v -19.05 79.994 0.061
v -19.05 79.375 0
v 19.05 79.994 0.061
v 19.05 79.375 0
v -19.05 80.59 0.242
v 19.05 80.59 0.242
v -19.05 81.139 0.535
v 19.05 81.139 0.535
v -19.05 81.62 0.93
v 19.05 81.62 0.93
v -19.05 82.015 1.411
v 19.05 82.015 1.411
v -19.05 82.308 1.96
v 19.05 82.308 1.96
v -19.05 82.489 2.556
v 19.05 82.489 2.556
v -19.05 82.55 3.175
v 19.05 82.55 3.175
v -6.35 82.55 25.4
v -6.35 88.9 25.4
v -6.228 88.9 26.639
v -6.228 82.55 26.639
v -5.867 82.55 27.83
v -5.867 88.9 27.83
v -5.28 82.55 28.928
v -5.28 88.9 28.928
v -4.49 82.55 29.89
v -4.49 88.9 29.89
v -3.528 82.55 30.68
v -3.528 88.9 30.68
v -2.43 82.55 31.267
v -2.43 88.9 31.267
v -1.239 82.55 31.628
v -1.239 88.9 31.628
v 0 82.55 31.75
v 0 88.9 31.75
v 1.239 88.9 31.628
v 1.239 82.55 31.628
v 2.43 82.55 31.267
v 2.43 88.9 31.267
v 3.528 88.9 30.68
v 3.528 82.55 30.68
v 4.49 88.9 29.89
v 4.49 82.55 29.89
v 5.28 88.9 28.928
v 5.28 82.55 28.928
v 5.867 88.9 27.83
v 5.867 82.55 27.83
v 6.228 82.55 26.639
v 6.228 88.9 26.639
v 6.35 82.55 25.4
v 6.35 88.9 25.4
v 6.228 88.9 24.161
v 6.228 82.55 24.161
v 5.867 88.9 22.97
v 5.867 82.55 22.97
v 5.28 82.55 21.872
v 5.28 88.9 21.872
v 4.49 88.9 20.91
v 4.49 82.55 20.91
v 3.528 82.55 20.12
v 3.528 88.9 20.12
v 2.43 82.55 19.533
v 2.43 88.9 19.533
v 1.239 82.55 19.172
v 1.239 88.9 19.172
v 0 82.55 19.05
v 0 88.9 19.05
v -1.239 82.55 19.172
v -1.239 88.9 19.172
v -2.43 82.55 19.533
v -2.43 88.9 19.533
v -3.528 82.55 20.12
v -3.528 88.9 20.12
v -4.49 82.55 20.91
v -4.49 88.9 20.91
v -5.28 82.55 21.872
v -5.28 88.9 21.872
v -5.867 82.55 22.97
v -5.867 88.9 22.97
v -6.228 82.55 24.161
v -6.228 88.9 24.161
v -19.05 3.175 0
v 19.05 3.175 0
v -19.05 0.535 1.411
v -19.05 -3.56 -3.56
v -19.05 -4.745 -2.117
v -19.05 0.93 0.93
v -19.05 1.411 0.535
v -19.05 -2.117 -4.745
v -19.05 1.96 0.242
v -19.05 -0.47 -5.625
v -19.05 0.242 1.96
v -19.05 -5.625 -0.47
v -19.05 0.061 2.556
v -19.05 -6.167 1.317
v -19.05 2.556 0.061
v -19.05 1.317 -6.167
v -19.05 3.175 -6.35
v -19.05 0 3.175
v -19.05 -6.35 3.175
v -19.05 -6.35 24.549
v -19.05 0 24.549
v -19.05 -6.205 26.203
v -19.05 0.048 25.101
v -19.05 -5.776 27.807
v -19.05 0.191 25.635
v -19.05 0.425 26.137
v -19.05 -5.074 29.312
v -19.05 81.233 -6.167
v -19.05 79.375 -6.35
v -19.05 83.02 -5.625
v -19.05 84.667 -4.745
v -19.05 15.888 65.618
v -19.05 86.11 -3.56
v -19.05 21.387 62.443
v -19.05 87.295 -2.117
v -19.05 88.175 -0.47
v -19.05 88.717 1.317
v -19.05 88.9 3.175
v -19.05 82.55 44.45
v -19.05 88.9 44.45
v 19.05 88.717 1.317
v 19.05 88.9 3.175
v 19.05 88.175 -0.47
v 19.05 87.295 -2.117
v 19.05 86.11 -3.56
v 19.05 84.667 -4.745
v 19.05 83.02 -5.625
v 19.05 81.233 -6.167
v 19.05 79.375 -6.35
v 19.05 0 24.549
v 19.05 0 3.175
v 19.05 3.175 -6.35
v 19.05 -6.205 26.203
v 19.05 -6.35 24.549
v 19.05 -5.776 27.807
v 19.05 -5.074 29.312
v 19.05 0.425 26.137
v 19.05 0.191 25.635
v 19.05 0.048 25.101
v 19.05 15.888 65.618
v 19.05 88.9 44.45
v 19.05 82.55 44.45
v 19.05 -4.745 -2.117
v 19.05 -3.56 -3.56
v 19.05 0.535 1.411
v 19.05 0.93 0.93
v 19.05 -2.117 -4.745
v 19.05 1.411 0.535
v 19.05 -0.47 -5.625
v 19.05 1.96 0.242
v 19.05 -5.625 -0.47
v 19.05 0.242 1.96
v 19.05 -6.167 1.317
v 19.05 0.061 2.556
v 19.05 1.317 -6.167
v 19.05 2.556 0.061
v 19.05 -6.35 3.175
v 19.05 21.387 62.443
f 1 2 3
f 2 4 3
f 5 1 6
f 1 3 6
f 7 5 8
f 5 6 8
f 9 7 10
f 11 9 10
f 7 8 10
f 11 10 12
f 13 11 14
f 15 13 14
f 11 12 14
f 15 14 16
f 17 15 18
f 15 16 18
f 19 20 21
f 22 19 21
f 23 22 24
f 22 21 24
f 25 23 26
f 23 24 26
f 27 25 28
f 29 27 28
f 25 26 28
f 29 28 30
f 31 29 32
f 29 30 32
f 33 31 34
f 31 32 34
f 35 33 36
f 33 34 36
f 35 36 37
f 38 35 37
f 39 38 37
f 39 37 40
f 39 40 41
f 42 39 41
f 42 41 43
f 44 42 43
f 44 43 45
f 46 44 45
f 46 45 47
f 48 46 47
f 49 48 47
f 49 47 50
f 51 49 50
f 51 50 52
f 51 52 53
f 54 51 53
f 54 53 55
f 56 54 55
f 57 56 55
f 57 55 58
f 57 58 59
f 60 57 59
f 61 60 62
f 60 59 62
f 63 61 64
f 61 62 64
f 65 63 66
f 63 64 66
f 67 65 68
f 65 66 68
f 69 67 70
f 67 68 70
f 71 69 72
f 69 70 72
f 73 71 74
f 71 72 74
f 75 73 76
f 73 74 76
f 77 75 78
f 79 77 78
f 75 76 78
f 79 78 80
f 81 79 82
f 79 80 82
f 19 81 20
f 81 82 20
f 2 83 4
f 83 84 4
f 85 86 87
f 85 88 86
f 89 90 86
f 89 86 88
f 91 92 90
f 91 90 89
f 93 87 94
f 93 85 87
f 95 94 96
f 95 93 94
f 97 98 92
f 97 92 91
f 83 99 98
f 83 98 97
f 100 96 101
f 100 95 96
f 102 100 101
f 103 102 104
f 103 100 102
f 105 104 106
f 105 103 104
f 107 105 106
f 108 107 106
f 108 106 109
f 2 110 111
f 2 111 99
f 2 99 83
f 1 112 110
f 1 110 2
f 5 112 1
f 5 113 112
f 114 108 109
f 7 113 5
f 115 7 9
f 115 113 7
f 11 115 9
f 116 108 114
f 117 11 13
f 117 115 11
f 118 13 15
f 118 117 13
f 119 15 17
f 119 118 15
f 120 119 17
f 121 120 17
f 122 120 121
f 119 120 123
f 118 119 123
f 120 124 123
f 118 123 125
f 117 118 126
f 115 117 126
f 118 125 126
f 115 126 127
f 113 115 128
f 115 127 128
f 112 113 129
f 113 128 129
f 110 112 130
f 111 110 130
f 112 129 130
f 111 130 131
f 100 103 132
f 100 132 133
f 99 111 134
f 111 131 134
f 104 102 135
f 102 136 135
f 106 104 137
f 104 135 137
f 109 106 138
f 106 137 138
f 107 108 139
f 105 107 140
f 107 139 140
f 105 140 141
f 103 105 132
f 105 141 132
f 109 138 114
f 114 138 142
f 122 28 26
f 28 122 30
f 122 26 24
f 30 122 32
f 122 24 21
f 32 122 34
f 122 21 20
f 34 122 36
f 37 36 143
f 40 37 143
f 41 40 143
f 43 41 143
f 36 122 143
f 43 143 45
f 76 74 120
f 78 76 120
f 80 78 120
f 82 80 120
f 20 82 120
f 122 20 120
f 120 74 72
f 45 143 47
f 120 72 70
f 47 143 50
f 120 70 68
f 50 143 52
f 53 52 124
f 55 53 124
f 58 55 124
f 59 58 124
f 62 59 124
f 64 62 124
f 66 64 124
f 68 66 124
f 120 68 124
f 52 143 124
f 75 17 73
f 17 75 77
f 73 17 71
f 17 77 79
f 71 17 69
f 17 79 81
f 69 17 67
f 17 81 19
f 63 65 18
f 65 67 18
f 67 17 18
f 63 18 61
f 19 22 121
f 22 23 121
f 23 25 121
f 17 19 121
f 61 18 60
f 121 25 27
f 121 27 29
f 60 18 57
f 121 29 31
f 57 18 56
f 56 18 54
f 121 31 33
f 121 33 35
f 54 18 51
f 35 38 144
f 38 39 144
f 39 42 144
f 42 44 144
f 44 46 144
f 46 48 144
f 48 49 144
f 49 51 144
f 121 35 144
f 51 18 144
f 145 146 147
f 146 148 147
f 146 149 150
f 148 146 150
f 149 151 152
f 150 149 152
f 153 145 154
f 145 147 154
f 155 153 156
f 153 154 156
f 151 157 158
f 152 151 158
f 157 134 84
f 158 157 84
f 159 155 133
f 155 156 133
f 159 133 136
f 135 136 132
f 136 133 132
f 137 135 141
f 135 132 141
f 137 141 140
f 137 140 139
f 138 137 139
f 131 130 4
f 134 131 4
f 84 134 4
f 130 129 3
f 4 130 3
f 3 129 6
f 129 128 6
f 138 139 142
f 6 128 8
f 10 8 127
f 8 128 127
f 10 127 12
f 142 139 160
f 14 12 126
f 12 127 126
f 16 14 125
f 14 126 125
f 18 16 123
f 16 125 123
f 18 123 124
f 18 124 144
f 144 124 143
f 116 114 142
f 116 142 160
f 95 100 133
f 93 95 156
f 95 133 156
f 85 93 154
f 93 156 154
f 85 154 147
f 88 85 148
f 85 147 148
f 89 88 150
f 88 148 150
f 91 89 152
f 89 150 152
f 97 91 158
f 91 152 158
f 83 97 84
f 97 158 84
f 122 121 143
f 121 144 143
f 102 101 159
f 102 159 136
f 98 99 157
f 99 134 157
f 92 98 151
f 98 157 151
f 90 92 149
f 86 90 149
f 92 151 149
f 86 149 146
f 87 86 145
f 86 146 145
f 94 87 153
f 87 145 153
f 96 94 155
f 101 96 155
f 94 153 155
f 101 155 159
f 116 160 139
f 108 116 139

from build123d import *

# Parameters (mm, degrees)
BASE_EXTRUDE_THIN_DEPTH = 19.05
CUT_EXTRUDE1_REACH      = 97.25
SKETCH2_R               = 6.35


with BuildPart() as part:
    # Sketch1 → Base-Extrude-Thin (new body, symmetric)
    with BuildSketch(Plane(origin=(0, 0, 0), x_dir=(0, 0, -1), z_dir=(1, 0, 0))):
        with BuildLine():
            Line((-62.443024211, 21.3868), (-26.136761314, 0.425369343))
            ThreePointArc((-26.136761314, 0.425369343), (-25.371011782, 0.108185502), (-24.549261314, 0))
            Line((-24.549261314, 0), (-3.175, 0))
            ThreePointArc((-3.175, 0), (-0.92993597, 0.92993597), (0, 3.175))
            Line((0, 3.175), (0, 79.375))
            ThreePointArc((0, 79.375), (-0.92993597, 81.62006403), (-3.175, 82.55))
            Line((-3.175, 82.55), (-44.45, 82.55))
            Line((-44.45, 82.55), (-44.45, 88.9))
            Line((-44.45, 88.9), (-3.175, 88.9))
            ThreePointArc((-3.175, 88.9), (3.560192091, 86.110192091), (6.35, 79.375))
            Line((6.35, 79.375), (6.35, 3.175))
            ThreePointArc((6.35, 3.175), (3.560192091, -3.560192091), (-3.175, -6.35))
            Line((-3.175, -6.35), (-24.549261314, -6.35))
            ThreePointArc((-24.549261314, -6.35), (-27.014512719, -6.025443495), (-29.311761314, -5.073891971))
            Line((-29.311761314, -5.073891971), (-65.618024211, 15.887538686))
            Line((-65.618024211, 15.887538686), (-62.443024211, 21.3868))
        make_face()
    extrude(amount=BASE_EXTRUDE_THIN_DEPTH, both=True)

    # Sketch2 → Cut-Extrude1 (cut, up to next)
    with BuildSketch(Plane(origin=(0, 88.9, 0), x_dir=(-1, 0, 0), z_dir=(0, 1, 0)), mode=Mode.PRIVATE) as cut_extrude1_sk1:
        with Locations((0, 25.4)):
            Circle(SKETCH2_R)
    cut_extrude1_tool1 = extrude(cut_extrude1_sk1.sketch, amount=-CUT_EXTRUDE1_REACH, mode=Mode.PRIVATE) & part.part
    add(cut_extrude1_tool1.solids().sort_by_distance((0, 88.9, 25.4))[0], mode=Mode.SUBTRACT)


solid = part.part
